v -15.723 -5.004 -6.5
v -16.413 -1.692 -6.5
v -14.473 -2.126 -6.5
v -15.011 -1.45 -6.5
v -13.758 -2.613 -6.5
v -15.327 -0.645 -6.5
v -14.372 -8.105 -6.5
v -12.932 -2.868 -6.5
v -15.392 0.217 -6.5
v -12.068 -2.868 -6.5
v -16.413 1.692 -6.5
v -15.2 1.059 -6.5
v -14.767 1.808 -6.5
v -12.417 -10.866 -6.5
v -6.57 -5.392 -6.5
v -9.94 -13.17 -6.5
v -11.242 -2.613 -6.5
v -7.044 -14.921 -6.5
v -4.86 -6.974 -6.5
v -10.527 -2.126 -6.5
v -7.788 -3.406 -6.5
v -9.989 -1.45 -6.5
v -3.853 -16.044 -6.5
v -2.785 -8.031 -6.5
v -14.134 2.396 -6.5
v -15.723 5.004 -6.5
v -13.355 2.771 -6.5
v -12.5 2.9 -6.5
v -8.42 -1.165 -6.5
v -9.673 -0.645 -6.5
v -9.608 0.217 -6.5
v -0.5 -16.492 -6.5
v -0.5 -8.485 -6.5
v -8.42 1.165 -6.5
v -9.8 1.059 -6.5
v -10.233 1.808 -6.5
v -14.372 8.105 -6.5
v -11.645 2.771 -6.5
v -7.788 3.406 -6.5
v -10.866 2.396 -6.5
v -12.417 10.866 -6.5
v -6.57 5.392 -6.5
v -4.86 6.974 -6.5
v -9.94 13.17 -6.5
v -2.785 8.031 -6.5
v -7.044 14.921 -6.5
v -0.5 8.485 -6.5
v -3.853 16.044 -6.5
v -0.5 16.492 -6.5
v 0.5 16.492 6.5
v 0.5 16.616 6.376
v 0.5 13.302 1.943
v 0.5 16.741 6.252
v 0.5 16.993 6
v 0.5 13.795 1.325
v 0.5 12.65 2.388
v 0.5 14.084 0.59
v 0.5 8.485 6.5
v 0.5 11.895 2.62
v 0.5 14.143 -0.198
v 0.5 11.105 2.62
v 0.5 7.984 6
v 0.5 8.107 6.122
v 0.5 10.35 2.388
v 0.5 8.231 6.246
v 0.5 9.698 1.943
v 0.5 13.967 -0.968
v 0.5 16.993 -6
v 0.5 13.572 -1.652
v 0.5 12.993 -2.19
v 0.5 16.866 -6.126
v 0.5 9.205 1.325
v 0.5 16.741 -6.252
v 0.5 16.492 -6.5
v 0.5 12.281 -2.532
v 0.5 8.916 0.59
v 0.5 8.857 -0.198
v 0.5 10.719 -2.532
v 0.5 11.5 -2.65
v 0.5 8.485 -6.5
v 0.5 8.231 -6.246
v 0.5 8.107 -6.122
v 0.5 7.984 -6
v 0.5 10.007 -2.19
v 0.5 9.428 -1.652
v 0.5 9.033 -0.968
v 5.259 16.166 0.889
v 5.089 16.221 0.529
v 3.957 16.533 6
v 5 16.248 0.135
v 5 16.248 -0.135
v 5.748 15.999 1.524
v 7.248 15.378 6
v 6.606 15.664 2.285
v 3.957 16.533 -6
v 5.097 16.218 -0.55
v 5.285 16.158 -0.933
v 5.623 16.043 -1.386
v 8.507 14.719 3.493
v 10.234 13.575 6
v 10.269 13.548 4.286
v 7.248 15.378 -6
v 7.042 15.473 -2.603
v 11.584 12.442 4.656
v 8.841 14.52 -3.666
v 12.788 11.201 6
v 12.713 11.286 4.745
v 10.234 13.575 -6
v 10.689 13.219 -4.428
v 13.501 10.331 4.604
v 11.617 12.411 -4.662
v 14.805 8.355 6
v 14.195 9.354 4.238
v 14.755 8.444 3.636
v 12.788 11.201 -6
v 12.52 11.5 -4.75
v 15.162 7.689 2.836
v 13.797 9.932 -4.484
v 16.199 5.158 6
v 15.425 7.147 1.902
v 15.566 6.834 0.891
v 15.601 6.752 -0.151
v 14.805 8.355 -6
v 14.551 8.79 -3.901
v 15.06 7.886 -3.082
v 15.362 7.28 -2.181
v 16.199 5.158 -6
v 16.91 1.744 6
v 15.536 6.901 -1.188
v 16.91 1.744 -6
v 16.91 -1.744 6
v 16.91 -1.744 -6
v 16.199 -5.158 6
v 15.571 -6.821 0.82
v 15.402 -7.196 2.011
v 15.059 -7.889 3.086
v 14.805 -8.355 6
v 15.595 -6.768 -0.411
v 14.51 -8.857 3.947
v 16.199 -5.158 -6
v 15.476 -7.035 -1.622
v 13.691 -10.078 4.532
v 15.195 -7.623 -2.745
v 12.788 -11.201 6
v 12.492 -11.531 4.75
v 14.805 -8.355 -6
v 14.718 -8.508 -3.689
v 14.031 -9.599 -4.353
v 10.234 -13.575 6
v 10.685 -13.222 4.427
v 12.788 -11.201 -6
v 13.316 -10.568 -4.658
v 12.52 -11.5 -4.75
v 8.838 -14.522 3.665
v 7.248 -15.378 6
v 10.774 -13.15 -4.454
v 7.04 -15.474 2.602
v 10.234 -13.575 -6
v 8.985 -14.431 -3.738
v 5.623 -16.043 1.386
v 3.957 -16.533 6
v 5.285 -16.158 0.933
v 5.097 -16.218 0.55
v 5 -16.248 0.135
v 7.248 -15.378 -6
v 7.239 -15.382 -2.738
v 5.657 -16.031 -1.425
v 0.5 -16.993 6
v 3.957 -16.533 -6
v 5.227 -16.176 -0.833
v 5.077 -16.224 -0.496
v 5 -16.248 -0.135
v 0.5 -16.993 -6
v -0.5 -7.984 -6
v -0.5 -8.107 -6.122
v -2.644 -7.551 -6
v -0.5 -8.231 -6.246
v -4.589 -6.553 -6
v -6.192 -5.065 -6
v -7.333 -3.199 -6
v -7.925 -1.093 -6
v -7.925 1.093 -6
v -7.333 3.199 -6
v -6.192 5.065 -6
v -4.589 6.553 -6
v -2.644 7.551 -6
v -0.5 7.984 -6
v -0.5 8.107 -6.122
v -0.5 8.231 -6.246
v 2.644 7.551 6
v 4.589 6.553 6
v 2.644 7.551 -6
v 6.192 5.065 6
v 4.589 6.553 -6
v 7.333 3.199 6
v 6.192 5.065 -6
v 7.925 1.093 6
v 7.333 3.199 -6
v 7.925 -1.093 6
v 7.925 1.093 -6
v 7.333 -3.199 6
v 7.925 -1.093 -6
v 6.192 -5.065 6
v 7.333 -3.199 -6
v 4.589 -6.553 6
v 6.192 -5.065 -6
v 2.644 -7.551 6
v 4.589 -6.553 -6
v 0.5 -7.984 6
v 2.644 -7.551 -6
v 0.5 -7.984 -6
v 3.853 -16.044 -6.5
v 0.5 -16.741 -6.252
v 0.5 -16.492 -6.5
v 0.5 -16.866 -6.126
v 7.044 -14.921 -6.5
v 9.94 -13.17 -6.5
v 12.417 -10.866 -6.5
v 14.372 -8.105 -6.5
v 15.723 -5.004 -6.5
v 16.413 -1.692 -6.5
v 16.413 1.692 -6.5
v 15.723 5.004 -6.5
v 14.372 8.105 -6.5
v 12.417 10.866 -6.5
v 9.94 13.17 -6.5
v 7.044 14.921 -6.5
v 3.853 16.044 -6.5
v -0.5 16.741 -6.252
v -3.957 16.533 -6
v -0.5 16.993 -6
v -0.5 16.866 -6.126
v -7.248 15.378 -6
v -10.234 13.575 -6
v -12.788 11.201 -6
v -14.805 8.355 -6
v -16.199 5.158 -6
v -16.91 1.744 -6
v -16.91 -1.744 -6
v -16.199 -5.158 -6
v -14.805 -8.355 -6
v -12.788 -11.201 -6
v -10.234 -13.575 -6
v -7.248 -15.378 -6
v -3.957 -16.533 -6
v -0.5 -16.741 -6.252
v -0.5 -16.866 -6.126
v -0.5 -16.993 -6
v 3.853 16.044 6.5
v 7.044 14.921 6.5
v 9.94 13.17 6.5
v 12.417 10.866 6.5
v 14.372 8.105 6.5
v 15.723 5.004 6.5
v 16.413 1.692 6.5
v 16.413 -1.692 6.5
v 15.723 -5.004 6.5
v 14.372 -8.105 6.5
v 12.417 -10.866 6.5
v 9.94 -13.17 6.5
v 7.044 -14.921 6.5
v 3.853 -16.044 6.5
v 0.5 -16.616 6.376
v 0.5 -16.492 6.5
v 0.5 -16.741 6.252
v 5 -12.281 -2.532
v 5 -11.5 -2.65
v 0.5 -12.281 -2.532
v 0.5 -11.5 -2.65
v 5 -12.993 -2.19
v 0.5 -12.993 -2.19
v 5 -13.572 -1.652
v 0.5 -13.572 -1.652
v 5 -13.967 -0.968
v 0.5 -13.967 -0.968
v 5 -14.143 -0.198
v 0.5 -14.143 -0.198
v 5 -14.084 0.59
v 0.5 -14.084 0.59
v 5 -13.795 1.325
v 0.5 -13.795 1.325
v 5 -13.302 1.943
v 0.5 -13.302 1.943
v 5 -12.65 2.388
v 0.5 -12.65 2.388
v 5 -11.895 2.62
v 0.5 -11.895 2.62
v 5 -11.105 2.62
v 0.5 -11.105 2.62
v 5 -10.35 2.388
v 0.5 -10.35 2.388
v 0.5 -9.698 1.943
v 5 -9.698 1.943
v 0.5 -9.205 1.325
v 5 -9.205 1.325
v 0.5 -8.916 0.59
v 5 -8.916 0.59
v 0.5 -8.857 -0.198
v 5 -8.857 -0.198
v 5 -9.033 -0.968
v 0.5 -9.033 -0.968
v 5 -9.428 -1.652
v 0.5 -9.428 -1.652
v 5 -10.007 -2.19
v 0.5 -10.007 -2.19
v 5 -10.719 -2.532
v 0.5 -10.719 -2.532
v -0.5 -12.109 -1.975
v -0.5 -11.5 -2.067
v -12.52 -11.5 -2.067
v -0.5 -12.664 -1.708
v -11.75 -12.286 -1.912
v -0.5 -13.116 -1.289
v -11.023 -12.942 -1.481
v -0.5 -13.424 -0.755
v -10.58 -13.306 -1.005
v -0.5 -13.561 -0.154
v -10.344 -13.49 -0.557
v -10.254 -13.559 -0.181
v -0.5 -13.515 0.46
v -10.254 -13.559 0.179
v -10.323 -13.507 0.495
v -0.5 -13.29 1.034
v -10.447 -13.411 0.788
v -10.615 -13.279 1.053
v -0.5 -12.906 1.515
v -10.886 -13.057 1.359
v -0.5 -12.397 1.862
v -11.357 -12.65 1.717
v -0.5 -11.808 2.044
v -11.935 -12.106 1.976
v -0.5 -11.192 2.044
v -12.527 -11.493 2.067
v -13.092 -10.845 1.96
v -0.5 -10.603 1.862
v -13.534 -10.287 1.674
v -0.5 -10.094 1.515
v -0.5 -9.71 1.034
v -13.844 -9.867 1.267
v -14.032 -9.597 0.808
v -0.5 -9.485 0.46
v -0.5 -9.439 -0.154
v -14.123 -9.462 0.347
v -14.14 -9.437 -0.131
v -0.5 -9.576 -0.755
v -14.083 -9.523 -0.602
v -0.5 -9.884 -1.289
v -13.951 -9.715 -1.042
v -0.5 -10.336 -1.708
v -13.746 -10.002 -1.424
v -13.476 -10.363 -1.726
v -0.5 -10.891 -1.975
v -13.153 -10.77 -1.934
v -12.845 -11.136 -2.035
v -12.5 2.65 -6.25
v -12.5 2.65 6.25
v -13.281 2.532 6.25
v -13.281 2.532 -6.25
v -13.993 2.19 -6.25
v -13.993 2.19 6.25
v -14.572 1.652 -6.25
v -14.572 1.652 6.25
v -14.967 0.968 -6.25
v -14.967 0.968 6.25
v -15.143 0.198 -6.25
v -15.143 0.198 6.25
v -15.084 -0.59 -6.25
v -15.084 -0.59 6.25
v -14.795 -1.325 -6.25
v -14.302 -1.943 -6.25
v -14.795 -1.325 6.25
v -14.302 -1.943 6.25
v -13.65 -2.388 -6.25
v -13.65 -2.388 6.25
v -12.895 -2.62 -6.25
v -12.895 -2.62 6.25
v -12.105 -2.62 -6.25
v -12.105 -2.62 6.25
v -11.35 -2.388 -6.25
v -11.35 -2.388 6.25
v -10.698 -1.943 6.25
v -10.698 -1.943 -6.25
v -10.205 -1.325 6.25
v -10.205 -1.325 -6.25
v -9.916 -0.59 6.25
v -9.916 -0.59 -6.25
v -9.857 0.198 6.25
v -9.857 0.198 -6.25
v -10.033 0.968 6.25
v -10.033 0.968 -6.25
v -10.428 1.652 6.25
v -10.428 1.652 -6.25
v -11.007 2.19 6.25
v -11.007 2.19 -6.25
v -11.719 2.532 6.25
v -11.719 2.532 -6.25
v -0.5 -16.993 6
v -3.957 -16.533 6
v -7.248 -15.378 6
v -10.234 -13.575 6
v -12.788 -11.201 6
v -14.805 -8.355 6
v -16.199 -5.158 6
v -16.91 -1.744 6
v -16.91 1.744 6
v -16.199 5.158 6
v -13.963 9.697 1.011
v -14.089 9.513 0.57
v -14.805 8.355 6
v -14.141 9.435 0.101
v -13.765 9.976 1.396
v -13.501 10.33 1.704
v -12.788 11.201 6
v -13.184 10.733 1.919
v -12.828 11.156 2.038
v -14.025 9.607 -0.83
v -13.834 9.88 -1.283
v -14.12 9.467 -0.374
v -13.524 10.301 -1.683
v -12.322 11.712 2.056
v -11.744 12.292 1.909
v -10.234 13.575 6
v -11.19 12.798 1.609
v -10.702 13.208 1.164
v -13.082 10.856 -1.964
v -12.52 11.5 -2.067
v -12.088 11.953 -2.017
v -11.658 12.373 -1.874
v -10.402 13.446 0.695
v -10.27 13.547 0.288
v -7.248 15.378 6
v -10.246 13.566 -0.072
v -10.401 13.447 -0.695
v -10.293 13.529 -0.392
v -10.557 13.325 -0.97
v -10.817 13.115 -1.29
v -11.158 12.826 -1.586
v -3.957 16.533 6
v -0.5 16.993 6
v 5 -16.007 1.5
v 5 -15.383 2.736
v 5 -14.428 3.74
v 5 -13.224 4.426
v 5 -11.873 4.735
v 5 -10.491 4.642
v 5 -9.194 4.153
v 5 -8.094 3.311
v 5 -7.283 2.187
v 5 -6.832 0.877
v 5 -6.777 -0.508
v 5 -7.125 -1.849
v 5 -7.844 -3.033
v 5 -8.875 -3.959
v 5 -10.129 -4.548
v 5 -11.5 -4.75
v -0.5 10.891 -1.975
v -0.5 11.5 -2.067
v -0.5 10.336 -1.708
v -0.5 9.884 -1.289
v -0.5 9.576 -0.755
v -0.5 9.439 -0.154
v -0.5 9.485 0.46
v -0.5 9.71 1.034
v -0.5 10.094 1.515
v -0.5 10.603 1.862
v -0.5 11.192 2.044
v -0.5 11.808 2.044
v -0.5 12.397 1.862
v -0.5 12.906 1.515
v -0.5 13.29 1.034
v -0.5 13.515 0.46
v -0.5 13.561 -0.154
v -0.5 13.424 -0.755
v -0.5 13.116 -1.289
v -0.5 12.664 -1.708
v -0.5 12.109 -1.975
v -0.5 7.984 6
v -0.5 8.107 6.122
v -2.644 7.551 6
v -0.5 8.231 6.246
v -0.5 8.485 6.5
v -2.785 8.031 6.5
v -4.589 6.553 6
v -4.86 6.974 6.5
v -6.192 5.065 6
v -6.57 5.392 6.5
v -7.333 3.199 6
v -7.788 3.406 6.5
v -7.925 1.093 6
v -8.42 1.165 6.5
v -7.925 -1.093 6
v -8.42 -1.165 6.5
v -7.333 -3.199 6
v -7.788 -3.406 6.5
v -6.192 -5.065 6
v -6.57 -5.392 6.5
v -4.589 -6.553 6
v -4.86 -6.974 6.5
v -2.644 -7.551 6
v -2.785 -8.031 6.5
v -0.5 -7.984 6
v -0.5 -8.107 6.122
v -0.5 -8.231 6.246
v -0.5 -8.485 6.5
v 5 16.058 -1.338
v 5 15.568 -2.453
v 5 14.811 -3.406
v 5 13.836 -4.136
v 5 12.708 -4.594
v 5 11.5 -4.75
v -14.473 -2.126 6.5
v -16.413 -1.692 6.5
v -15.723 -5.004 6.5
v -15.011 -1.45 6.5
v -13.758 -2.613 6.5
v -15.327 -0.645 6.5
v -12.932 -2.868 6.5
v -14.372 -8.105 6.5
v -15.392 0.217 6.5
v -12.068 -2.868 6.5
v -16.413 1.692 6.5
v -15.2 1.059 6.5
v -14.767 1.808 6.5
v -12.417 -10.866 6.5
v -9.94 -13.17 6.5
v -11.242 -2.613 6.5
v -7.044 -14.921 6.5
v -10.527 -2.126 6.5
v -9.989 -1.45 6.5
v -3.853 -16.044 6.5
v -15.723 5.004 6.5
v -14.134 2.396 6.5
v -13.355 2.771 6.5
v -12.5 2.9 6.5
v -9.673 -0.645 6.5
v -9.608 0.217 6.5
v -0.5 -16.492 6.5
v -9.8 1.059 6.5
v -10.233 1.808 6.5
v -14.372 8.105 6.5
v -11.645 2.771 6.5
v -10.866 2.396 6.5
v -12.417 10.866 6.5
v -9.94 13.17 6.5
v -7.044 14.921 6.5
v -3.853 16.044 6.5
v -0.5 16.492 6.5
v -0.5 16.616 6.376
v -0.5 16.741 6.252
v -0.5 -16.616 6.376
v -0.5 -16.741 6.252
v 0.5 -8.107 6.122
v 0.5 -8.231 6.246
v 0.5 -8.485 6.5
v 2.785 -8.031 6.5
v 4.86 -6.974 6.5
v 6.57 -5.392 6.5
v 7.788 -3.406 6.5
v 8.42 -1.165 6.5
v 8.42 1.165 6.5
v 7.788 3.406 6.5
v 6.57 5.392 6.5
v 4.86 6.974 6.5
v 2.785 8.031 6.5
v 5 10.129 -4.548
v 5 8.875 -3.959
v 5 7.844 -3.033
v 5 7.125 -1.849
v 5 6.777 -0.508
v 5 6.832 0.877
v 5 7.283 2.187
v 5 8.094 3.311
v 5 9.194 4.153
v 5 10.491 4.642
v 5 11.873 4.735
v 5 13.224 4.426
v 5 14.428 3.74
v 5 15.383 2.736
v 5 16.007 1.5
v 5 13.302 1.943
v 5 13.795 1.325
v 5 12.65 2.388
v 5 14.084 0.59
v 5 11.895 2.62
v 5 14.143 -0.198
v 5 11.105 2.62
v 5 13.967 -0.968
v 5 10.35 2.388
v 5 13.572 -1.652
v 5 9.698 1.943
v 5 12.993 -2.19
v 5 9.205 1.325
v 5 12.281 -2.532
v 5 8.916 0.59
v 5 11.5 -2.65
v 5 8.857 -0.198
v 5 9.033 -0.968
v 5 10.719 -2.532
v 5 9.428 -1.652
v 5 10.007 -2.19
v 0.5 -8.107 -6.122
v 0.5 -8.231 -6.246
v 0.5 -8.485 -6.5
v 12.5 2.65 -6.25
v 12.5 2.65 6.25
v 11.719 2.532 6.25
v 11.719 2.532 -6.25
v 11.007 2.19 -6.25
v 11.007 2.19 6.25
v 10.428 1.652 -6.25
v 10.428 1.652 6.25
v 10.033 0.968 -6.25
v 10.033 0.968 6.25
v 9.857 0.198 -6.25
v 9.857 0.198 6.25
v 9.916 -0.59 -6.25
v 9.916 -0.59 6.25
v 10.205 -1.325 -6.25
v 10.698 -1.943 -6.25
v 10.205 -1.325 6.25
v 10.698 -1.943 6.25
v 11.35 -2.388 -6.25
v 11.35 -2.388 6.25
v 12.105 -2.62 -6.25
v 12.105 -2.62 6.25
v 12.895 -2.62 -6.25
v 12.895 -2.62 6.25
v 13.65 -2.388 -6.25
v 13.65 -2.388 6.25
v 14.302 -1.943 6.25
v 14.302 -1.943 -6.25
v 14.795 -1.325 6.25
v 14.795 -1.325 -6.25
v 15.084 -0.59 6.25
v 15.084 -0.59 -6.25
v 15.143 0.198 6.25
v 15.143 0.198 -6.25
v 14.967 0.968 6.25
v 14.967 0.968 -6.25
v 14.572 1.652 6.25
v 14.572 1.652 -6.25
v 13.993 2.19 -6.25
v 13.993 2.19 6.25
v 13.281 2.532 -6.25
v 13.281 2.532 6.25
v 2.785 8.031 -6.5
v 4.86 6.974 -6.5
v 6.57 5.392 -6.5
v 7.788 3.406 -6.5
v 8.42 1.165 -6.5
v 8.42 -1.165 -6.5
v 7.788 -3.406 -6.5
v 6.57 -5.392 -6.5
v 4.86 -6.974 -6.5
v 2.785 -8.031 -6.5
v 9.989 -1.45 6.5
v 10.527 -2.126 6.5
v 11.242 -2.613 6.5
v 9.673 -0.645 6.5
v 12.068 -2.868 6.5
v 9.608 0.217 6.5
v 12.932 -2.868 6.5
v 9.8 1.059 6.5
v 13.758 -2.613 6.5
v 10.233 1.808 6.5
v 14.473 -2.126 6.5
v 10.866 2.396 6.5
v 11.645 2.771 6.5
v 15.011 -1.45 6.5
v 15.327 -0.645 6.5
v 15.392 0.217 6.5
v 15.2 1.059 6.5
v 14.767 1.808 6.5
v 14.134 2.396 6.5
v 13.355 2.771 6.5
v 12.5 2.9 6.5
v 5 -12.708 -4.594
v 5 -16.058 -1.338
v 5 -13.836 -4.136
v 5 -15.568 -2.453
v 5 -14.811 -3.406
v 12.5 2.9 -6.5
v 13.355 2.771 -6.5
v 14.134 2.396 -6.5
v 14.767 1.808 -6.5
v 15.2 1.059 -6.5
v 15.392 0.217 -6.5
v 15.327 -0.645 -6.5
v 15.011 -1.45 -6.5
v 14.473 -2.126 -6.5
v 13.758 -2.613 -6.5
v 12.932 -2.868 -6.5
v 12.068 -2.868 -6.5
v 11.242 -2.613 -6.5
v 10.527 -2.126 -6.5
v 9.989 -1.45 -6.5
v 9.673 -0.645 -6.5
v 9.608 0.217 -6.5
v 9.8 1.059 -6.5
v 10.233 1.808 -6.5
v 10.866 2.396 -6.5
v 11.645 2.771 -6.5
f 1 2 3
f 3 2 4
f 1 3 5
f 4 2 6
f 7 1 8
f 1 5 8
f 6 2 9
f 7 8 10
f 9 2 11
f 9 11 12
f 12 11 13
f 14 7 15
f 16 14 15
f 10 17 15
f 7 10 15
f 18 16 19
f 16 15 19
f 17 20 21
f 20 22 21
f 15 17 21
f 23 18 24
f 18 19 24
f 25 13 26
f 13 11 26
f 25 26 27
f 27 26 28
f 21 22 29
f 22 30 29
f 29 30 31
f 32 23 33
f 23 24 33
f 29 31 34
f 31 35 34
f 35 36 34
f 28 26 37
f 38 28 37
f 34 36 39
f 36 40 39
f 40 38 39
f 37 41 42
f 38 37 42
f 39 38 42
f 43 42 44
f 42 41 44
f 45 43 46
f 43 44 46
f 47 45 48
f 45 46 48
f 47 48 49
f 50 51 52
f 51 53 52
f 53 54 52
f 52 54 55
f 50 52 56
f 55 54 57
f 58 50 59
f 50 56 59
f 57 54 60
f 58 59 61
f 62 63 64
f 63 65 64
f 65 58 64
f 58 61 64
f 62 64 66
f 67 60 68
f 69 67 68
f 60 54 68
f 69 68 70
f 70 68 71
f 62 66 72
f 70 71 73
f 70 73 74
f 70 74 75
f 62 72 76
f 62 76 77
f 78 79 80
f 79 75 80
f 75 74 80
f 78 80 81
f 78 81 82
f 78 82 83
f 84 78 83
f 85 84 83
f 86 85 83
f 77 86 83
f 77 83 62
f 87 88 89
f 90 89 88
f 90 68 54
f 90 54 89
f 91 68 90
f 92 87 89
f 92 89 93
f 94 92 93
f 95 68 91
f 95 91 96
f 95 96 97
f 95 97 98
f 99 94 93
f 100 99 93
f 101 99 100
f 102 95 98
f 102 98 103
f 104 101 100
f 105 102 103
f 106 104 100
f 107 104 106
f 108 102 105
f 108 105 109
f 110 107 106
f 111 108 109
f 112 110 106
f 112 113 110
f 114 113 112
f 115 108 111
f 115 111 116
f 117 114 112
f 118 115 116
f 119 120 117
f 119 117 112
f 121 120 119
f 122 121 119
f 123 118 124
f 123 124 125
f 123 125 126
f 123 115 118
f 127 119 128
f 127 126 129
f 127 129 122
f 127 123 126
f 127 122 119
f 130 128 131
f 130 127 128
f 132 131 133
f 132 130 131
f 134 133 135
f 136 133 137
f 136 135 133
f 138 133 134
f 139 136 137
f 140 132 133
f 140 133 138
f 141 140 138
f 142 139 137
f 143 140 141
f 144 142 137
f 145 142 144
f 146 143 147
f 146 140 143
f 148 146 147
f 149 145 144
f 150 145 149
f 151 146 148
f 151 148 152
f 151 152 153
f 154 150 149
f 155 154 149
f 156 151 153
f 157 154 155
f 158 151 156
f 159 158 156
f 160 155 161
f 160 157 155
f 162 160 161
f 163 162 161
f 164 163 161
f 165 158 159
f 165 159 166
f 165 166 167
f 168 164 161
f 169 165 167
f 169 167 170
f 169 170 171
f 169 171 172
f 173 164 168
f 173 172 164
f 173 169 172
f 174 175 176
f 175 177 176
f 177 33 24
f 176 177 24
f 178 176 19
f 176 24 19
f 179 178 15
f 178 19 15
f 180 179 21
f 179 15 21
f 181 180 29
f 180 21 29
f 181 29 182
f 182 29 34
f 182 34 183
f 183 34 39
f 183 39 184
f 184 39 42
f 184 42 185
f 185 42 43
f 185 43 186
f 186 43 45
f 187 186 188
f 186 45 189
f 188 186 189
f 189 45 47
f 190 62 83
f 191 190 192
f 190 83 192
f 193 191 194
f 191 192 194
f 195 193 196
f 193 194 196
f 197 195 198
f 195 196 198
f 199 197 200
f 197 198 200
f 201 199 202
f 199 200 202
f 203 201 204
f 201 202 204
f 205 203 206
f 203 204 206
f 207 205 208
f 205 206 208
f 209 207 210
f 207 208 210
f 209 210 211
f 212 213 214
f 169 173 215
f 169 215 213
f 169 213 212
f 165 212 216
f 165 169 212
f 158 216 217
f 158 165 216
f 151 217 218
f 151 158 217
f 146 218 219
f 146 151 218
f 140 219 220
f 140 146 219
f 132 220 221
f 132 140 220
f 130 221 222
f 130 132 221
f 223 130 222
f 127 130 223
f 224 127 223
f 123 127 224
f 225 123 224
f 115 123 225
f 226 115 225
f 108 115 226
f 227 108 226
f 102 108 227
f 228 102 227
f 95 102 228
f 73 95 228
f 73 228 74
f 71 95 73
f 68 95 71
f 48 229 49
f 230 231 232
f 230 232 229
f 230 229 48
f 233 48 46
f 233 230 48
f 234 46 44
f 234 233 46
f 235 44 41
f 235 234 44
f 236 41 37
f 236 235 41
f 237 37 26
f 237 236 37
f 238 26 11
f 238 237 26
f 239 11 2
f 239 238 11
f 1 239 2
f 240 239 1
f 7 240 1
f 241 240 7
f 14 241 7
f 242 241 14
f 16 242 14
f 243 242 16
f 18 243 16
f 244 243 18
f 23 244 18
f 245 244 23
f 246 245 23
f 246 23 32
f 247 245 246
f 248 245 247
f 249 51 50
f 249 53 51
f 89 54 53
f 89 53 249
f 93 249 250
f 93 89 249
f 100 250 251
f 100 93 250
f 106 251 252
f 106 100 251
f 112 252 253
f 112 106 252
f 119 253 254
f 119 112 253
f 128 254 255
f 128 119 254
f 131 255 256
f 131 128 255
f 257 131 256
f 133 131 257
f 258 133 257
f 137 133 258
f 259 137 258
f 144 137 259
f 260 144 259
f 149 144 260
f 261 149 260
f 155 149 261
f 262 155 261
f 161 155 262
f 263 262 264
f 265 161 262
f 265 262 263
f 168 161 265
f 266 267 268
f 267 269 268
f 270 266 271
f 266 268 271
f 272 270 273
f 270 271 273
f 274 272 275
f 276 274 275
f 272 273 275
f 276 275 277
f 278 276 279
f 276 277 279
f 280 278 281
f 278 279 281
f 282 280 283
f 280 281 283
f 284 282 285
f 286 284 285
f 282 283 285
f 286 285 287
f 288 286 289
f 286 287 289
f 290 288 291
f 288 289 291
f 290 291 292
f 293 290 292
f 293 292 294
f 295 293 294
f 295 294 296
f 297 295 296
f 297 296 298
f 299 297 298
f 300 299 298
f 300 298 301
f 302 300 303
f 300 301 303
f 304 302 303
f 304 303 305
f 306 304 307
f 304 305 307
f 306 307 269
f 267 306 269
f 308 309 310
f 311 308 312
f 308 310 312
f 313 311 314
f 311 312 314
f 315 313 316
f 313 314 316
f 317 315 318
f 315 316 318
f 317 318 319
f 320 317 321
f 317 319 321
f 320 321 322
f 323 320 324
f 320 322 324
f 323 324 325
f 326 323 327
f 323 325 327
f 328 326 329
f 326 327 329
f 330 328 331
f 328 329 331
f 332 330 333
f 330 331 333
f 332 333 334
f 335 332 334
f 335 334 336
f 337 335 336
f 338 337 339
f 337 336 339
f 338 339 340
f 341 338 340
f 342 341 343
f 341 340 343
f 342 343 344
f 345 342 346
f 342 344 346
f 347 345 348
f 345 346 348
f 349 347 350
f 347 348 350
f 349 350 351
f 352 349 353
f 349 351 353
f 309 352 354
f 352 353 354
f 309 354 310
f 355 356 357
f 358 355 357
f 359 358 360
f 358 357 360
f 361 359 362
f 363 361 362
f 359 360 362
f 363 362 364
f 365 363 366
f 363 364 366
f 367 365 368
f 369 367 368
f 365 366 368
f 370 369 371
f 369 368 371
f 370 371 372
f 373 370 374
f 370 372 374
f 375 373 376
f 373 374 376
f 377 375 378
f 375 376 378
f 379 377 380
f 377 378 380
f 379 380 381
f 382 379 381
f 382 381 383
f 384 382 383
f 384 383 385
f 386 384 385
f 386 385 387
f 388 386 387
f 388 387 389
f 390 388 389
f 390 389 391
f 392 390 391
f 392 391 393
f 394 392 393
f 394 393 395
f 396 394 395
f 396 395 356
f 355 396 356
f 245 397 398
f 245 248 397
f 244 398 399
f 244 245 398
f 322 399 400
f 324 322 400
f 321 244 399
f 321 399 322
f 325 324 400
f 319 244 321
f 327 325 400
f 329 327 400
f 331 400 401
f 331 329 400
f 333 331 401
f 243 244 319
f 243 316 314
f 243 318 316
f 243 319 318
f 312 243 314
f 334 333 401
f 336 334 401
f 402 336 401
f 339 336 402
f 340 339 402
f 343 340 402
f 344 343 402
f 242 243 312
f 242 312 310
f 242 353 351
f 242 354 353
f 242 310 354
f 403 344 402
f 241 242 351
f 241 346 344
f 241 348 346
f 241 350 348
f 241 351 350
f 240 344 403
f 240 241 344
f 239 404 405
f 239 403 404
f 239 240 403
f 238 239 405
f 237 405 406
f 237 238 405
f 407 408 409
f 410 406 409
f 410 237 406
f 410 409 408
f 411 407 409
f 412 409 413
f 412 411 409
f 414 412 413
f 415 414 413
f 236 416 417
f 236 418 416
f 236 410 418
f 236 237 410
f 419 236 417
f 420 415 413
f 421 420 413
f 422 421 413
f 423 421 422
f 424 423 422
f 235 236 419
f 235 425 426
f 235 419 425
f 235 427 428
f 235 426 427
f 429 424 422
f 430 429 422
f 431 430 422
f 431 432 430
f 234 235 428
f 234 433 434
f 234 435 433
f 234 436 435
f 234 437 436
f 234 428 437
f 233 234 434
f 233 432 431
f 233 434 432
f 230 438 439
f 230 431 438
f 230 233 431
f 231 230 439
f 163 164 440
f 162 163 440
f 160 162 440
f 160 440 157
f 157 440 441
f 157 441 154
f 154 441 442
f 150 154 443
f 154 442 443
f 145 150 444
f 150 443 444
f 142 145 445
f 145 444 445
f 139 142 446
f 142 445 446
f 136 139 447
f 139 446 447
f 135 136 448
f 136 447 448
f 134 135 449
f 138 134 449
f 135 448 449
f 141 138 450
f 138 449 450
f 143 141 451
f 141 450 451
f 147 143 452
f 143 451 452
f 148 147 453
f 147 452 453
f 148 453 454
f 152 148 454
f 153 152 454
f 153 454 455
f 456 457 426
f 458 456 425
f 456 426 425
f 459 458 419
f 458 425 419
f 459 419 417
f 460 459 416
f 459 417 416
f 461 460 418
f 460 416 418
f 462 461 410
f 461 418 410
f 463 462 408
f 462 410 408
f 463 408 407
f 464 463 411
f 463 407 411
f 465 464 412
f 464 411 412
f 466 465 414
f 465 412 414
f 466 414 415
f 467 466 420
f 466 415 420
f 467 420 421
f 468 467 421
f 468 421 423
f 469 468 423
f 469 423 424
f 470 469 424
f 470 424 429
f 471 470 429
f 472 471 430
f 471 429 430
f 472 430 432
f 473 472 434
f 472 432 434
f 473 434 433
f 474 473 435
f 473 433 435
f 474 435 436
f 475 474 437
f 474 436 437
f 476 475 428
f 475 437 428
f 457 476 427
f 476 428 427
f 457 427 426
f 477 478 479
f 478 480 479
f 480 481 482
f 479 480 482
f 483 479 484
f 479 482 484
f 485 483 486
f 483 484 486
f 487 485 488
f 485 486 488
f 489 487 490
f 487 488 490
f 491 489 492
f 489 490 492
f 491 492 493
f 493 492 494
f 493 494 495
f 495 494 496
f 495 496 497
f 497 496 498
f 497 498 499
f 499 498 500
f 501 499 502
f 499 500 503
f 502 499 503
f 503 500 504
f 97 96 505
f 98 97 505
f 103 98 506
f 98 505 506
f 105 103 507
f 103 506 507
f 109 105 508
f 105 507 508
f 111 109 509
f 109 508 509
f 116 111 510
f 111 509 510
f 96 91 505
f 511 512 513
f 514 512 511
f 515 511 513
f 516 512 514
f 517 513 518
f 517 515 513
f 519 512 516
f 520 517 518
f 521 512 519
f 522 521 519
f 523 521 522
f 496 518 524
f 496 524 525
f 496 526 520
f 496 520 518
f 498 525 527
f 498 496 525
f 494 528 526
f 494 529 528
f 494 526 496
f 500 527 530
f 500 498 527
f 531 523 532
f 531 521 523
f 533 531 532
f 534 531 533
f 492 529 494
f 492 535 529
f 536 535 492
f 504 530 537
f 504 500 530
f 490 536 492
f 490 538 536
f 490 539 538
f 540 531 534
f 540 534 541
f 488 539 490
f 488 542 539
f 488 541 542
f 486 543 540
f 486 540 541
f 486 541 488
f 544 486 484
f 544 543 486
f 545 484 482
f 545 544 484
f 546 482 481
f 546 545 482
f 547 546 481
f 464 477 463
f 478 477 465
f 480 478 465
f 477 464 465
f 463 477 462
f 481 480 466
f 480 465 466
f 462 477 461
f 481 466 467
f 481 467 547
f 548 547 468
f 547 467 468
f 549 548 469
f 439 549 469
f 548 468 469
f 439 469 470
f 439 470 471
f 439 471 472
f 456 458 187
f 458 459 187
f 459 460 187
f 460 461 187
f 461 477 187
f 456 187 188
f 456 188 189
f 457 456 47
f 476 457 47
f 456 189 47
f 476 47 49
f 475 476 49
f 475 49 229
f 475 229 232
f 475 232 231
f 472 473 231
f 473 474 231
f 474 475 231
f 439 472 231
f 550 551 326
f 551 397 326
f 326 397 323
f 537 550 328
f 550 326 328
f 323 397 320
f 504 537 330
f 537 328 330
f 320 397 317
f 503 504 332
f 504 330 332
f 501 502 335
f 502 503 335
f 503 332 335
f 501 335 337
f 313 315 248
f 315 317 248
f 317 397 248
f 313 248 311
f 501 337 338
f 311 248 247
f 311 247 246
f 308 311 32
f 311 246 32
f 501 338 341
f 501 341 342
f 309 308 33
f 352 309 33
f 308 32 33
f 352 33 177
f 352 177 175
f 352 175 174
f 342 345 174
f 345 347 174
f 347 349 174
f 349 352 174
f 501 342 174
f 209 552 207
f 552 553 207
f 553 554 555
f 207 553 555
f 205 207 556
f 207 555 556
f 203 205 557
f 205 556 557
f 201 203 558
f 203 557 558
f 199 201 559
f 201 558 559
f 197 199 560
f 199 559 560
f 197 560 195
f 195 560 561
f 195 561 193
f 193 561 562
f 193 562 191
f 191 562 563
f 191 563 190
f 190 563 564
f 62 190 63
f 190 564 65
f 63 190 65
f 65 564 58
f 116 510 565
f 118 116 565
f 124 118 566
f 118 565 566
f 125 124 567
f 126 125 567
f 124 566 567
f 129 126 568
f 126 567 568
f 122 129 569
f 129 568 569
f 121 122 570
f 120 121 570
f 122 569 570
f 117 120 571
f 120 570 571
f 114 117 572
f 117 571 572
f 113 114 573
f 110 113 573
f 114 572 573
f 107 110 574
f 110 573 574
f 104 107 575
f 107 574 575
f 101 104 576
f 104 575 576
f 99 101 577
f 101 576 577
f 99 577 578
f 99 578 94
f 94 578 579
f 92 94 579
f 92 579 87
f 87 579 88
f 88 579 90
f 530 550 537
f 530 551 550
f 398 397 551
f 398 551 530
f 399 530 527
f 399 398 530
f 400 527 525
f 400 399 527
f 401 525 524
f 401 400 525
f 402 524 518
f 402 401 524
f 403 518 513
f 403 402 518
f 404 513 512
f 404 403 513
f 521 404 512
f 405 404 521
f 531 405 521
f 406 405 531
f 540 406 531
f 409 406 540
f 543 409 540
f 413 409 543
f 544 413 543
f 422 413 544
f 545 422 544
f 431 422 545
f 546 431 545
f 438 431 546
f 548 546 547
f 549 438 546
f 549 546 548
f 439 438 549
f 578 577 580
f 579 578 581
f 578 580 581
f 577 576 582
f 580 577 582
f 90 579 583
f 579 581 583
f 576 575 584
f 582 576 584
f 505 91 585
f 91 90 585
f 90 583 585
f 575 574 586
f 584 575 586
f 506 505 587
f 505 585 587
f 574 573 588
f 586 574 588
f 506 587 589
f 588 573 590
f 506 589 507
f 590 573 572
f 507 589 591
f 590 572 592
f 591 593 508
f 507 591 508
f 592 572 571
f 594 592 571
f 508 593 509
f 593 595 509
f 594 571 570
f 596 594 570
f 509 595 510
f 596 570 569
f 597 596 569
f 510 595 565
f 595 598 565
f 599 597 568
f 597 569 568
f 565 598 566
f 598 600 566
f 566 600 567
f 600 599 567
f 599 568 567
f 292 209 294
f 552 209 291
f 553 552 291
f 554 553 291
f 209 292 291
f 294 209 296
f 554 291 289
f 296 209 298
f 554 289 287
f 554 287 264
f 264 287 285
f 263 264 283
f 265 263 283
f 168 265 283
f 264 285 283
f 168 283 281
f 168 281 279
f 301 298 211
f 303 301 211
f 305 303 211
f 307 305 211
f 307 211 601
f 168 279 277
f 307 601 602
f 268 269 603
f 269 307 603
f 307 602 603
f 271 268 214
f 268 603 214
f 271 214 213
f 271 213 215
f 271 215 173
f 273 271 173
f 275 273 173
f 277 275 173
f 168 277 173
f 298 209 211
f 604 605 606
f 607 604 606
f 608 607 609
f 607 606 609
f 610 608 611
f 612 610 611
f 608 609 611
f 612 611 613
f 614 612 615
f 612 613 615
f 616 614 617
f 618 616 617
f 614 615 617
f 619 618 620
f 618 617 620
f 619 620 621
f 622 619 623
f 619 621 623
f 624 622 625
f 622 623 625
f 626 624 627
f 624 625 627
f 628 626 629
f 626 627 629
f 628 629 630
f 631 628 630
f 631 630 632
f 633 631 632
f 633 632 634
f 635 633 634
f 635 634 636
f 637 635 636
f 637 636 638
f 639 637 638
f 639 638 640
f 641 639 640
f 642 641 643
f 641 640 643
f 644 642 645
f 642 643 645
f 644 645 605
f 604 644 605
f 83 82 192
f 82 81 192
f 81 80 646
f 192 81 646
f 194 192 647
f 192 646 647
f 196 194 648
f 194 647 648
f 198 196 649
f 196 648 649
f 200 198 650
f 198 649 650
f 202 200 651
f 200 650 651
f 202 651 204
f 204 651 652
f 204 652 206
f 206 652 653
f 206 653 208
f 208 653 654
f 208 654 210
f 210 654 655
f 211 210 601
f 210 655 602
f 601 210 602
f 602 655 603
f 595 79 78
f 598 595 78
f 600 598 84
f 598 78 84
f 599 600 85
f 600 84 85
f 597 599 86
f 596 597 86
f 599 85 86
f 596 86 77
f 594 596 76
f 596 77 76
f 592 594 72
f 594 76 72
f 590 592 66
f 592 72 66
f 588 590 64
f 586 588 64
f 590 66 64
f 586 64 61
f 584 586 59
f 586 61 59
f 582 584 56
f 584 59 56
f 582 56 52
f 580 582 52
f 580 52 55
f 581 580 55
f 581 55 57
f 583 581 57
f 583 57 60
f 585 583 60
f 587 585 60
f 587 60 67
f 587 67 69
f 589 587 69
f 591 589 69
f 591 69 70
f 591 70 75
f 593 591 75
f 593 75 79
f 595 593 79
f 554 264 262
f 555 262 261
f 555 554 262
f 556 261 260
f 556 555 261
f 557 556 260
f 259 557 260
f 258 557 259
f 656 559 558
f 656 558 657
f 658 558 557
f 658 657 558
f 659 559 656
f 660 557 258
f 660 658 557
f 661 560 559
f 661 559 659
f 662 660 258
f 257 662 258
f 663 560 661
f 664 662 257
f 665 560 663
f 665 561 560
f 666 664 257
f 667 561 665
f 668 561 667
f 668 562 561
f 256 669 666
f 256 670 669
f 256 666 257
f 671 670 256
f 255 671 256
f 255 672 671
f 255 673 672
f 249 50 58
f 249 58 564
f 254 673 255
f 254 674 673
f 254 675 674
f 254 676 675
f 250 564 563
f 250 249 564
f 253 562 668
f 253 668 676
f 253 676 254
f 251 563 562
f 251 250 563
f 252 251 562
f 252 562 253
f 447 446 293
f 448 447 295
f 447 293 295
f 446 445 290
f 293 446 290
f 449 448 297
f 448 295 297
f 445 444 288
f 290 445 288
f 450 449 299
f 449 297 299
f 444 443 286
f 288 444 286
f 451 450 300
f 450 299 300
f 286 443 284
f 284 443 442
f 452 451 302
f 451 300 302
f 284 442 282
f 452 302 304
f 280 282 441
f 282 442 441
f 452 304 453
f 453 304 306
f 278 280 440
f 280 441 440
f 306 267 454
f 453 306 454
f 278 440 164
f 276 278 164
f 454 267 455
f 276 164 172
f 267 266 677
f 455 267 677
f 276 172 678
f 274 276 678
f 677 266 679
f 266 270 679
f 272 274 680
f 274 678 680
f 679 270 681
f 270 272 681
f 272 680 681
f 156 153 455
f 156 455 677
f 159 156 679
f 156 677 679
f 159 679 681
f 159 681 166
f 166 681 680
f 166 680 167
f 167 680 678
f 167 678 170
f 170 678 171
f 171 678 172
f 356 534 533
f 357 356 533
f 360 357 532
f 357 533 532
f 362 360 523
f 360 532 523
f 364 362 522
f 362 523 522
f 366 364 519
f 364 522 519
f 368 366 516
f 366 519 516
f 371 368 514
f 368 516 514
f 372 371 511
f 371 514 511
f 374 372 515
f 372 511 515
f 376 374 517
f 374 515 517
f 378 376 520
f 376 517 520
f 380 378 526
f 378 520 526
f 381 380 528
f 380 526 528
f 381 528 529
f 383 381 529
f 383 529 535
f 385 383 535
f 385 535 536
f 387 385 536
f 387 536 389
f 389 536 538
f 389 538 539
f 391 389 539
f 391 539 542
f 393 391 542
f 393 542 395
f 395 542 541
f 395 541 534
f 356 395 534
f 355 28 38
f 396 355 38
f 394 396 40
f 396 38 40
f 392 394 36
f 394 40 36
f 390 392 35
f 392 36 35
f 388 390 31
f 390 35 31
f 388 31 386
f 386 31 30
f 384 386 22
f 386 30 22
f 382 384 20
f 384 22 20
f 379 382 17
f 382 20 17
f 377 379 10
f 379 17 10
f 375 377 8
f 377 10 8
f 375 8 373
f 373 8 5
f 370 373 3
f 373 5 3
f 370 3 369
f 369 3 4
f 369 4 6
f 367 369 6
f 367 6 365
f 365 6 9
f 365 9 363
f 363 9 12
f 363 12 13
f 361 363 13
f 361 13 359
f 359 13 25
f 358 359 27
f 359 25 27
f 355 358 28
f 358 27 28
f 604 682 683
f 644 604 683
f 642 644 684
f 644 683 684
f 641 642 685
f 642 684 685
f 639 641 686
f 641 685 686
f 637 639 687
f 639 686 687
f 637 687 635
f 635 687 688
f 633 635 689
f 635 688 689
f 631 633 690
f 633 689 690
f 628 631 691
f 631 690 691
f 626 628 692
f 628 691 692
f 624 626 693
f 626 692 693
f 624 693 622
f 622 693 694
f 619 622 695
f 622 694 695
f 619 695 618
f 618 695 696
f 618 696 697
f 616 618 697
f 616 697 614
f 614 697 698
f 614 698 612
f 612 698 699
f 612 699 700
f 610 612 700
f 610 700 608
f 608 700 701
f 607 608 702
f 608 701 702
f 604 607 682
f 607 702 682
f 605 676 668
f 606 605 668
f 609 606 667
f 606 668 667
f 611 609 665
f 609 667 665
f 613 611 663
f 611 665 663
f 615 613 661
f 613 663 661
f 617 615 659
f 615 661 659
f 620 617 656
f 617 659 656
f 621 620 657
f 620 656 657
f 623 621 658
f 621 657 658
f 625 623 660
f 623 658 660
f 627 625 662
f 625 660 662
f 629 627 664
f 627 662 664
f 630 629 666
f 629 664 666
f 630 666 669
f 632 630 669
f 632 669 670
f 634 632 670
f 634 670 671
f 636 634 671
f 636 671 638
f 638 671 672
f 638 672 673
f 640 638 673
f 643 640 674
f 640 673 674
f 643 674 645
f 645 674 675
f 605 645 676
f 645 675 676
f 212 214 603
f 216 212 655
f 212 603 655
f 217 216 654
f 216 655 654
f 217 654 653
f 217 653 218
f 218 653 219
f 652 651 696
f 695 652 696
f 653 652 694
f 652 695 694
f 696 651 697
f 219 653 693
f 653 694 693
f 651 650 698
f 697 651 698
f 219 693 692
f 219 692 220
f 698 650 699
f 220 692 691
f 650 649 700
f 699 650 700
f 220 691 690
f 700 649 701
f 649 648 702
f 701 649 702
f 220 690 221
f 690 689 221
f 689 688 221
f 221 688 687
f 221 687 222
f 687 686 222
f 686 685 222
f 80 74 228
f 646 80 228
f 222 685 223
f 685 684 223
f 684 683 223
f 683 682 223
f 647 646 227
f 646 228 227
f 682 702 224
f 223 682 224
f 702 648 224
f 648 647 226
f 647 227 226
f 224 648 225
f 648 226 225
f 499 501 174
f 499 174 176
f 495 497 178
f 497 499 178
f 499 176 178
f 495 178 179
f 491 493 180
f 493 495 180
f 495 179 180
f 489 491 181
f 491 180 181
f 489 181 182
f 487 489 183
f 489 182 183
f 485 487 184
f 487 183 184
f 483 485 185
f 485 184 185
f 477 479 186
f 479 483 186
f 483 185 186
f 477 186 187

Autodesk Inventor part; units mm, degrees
ref_plane "XZ Plane" through (0, 0, 0) normal (0, 1, 0) x (-1, 0, 0)
sketch "Sketch1" plane through (0, 0, 0) normal (0, 0, 1) x (1, 0, 0)
  circle A0 centre (0, 0) radius 8
  circle A1 centre (0, 0) radius 17
  line L0 (0.5, -17) -> (-0.5, -17)
  line L1 (-0.5, -17) -> (-0.5, 17)
  line L2 (-0.5, 17) -> (0.5, 17)
  line L3 (0.5, 17) -> (0.5, -17)
  line L4 (0.5, -17) -> (-0.5, 17) construction
  line L5 (-0.5, -17) -> (0.5, 17) construction
  point P0 (0.5, -7.9844)
  point P1 (0.5, -16.9926)
  point P2 (0.5, 16.9926)
  point P3 (0.5, 7.9844)
  point P4 (-0.5, 7.9844)
  point P5 (-0.5, 16.9926)
  point P6 (-0.5, -16.9926)
  point P7 (-0.5, -7.9844)
  dimension "d0" = 16
  dimension "d1" = 34
  dimension "d2" = 1
extrude "Extrusion1" add sketch "Sketch1" along normal mid plane 13 contours A0 L3 A1 | A0 L1 A1
chamfer "Chamfer1" distance 0.5 angle 45 8 edges at (-8, 0, 6.5) (8, 0, 6.5) (17, 0, 6.5) (-17, 0, 6.5) (-17, 0, -6.5) (17, 0, -6.5) (-8, 0, -6.5) (8, 0, -6.5)
ref_plane "Work Plane1" through (17, 0, 0) normal (1, 0, 0) x (0, 1, 0)
sketch "Sketch2" plane through (17, 0, 0) normal (1, 0, 0) x (0, 1, 0)
  line L0 (16.4924, -6.5) -> (8.4853, -6.5) construction
  line L1 (16.9926, -6) -> (16.4924, -6.5) construction
  line L2 (16.9926, 6) -> (16.9926, -6) construction
  line L3 (16.4924, 6.5) -> (16.9926, 6) construction
  line L4 (8.4853, 6.5) -> (16.4924, 6.5) construction
  line L5 (7.9844, -6) -> (7.9844, 6) construction
  line L6 (-7.9844, -6) -> (-7.9844, 6) construction
  line L7 (-16.4924, 6.5) -> (-8.4853, 6.5) construction
  line L8 (-16.9926, 6) -> (-16.4924, 6.5) construction
  line L9 (-16.9926, -6) -> (-16.9926, 6) construction
  line L10 (-16.4924, -6.5) -> (-16.9926, -6) construction
  line L11 (-8.4853, -6.5) -> (-16.4924, -6.5) construction
  line L12 (-11.5, 0) -> (11.5, 0) construction
  point P0 (0, 0)
  point P1 (0, 0)
  dimension "d8" = 23
ref_plane "Work Plane2" through (5, 0, 0) normal (1, 0, 0) x (0, 1, 0)
hole "Hole1" at (17, 11.5, 0) at (17, -11.5, 0) direction (-1, 0, 0) diameter 4.134 end through all counterbore diameter 9.5 counterbore depth 12 thread size "M5x0.8" class "6H" standard "ANSI Metric M Profile"
sketch "Sketch3" plane through (5, 11.5, 0) normal (1, 0, 0) x (0, 0, -1)
  arc A0 (-0.1352, 4.7481) -> (0.1352, 4.7481) centre (0, 0) ccw projected
  circle A1 centre (0, 0) radius 2.067 projected
  arc A2 (0.1352, -27.7481) -> (-0.1352, -27.7481) centre (0, -23) ccw projected
  circle A3 centre (0, -23) radius 2.067 projected
  line L0 (0.1352, -27.7481) -> (-0.1352, -27.7481) projected
  line L1 (-0.1352, 4.7481) -> (0.1352, 4.7481) projected
  point P0 (0, -11.5)
hole "Hole2" at (5, 11.5, 0) at (5, -11.5, 0) direction (-1, 0, 0) diameter 5.3 depth 4.5
sketch "Sketch4" plane through (0, 0, -6.5) normal (0, 0, -1) x (-1, 0, 0)
  line L0 (-12.5, 0) -> (12.5, 0) construction
  line L1 (0, 0) -> (8, -6) construction
  line L2 (8, -6) -> (12.5, 0) construction
  dimension "d24" = 10
  dimension "d26" = 25
  dimension "d27" = 7.5
hole "Hole3" at (12.5, 0, -6.5) at (-12.5, 0, -6.5) direction (0, 0, 1) diameter 5.3 end through all
chamfer "Chamfer2" distance 0.25 angle 45 4 edges at (-12.5, -2.65, 6.5) (12.5, -2.65, 6.5) (-12.5, -2.65, -6.5) (12.5, -2.65, -6.5)
properties part number "Shaft Clamp" material "Aluminum 6061"
